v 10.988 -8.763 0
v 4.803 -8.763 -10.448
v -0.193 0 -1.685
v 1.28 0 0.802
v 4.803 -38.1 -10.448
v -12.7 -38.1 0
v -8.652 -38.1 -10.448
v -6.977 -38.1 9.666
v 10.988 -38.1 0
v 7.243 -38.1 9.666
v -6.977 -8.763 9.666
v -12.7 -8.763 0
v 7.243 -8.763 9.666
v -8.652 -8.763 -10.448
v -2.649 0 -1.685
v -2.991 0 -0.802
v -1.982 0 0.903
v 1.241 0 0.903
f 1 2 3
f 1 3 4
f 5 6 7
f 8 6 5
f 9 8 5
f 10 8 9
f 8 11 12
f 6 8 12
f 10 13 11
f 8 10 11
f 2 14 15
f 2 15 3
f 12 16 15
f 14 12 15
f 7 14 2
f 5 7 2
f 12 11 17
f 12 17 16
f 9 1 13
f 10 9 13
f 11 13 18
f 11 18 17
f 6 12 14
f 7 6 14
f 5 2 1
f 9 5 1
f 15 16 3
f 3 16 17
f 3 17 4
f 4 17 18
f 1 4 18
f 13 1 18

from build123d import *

# Parameters (mm, degrees)
F1_DEPTH = 38.1
F2_SIZE  = 8.763


with BuildPart() as f1:
    # F0 (on Front) → F1 (new body)
    with BuildSketch(Plane.XZ):
        Polygon((-6.977107, 9.66563), (-12.7, 0), (-8.651809, -10.447565), (4.802615, -10.447565), (10.988482, 0), (7.243273, 9.66563), align=None)
    extrude(amount=F1_DEPTH)

    # F2
    f2_edges = [f1.edges().sort_by_distance(p)[0] for p in [
        (0.133083, 0, 9.66563),
        (-9.838553, 0, 4.832815),
        (-10.675905, 0, -5.223783),
        (-1.924597, 0, -10.447565),
        (7.895549, 0, -5.223783),
        (9.115878, 0, 4.832815),
    ]]
    chamfer(f2_edges, length=F2_SIZE)


solid = f1.part
